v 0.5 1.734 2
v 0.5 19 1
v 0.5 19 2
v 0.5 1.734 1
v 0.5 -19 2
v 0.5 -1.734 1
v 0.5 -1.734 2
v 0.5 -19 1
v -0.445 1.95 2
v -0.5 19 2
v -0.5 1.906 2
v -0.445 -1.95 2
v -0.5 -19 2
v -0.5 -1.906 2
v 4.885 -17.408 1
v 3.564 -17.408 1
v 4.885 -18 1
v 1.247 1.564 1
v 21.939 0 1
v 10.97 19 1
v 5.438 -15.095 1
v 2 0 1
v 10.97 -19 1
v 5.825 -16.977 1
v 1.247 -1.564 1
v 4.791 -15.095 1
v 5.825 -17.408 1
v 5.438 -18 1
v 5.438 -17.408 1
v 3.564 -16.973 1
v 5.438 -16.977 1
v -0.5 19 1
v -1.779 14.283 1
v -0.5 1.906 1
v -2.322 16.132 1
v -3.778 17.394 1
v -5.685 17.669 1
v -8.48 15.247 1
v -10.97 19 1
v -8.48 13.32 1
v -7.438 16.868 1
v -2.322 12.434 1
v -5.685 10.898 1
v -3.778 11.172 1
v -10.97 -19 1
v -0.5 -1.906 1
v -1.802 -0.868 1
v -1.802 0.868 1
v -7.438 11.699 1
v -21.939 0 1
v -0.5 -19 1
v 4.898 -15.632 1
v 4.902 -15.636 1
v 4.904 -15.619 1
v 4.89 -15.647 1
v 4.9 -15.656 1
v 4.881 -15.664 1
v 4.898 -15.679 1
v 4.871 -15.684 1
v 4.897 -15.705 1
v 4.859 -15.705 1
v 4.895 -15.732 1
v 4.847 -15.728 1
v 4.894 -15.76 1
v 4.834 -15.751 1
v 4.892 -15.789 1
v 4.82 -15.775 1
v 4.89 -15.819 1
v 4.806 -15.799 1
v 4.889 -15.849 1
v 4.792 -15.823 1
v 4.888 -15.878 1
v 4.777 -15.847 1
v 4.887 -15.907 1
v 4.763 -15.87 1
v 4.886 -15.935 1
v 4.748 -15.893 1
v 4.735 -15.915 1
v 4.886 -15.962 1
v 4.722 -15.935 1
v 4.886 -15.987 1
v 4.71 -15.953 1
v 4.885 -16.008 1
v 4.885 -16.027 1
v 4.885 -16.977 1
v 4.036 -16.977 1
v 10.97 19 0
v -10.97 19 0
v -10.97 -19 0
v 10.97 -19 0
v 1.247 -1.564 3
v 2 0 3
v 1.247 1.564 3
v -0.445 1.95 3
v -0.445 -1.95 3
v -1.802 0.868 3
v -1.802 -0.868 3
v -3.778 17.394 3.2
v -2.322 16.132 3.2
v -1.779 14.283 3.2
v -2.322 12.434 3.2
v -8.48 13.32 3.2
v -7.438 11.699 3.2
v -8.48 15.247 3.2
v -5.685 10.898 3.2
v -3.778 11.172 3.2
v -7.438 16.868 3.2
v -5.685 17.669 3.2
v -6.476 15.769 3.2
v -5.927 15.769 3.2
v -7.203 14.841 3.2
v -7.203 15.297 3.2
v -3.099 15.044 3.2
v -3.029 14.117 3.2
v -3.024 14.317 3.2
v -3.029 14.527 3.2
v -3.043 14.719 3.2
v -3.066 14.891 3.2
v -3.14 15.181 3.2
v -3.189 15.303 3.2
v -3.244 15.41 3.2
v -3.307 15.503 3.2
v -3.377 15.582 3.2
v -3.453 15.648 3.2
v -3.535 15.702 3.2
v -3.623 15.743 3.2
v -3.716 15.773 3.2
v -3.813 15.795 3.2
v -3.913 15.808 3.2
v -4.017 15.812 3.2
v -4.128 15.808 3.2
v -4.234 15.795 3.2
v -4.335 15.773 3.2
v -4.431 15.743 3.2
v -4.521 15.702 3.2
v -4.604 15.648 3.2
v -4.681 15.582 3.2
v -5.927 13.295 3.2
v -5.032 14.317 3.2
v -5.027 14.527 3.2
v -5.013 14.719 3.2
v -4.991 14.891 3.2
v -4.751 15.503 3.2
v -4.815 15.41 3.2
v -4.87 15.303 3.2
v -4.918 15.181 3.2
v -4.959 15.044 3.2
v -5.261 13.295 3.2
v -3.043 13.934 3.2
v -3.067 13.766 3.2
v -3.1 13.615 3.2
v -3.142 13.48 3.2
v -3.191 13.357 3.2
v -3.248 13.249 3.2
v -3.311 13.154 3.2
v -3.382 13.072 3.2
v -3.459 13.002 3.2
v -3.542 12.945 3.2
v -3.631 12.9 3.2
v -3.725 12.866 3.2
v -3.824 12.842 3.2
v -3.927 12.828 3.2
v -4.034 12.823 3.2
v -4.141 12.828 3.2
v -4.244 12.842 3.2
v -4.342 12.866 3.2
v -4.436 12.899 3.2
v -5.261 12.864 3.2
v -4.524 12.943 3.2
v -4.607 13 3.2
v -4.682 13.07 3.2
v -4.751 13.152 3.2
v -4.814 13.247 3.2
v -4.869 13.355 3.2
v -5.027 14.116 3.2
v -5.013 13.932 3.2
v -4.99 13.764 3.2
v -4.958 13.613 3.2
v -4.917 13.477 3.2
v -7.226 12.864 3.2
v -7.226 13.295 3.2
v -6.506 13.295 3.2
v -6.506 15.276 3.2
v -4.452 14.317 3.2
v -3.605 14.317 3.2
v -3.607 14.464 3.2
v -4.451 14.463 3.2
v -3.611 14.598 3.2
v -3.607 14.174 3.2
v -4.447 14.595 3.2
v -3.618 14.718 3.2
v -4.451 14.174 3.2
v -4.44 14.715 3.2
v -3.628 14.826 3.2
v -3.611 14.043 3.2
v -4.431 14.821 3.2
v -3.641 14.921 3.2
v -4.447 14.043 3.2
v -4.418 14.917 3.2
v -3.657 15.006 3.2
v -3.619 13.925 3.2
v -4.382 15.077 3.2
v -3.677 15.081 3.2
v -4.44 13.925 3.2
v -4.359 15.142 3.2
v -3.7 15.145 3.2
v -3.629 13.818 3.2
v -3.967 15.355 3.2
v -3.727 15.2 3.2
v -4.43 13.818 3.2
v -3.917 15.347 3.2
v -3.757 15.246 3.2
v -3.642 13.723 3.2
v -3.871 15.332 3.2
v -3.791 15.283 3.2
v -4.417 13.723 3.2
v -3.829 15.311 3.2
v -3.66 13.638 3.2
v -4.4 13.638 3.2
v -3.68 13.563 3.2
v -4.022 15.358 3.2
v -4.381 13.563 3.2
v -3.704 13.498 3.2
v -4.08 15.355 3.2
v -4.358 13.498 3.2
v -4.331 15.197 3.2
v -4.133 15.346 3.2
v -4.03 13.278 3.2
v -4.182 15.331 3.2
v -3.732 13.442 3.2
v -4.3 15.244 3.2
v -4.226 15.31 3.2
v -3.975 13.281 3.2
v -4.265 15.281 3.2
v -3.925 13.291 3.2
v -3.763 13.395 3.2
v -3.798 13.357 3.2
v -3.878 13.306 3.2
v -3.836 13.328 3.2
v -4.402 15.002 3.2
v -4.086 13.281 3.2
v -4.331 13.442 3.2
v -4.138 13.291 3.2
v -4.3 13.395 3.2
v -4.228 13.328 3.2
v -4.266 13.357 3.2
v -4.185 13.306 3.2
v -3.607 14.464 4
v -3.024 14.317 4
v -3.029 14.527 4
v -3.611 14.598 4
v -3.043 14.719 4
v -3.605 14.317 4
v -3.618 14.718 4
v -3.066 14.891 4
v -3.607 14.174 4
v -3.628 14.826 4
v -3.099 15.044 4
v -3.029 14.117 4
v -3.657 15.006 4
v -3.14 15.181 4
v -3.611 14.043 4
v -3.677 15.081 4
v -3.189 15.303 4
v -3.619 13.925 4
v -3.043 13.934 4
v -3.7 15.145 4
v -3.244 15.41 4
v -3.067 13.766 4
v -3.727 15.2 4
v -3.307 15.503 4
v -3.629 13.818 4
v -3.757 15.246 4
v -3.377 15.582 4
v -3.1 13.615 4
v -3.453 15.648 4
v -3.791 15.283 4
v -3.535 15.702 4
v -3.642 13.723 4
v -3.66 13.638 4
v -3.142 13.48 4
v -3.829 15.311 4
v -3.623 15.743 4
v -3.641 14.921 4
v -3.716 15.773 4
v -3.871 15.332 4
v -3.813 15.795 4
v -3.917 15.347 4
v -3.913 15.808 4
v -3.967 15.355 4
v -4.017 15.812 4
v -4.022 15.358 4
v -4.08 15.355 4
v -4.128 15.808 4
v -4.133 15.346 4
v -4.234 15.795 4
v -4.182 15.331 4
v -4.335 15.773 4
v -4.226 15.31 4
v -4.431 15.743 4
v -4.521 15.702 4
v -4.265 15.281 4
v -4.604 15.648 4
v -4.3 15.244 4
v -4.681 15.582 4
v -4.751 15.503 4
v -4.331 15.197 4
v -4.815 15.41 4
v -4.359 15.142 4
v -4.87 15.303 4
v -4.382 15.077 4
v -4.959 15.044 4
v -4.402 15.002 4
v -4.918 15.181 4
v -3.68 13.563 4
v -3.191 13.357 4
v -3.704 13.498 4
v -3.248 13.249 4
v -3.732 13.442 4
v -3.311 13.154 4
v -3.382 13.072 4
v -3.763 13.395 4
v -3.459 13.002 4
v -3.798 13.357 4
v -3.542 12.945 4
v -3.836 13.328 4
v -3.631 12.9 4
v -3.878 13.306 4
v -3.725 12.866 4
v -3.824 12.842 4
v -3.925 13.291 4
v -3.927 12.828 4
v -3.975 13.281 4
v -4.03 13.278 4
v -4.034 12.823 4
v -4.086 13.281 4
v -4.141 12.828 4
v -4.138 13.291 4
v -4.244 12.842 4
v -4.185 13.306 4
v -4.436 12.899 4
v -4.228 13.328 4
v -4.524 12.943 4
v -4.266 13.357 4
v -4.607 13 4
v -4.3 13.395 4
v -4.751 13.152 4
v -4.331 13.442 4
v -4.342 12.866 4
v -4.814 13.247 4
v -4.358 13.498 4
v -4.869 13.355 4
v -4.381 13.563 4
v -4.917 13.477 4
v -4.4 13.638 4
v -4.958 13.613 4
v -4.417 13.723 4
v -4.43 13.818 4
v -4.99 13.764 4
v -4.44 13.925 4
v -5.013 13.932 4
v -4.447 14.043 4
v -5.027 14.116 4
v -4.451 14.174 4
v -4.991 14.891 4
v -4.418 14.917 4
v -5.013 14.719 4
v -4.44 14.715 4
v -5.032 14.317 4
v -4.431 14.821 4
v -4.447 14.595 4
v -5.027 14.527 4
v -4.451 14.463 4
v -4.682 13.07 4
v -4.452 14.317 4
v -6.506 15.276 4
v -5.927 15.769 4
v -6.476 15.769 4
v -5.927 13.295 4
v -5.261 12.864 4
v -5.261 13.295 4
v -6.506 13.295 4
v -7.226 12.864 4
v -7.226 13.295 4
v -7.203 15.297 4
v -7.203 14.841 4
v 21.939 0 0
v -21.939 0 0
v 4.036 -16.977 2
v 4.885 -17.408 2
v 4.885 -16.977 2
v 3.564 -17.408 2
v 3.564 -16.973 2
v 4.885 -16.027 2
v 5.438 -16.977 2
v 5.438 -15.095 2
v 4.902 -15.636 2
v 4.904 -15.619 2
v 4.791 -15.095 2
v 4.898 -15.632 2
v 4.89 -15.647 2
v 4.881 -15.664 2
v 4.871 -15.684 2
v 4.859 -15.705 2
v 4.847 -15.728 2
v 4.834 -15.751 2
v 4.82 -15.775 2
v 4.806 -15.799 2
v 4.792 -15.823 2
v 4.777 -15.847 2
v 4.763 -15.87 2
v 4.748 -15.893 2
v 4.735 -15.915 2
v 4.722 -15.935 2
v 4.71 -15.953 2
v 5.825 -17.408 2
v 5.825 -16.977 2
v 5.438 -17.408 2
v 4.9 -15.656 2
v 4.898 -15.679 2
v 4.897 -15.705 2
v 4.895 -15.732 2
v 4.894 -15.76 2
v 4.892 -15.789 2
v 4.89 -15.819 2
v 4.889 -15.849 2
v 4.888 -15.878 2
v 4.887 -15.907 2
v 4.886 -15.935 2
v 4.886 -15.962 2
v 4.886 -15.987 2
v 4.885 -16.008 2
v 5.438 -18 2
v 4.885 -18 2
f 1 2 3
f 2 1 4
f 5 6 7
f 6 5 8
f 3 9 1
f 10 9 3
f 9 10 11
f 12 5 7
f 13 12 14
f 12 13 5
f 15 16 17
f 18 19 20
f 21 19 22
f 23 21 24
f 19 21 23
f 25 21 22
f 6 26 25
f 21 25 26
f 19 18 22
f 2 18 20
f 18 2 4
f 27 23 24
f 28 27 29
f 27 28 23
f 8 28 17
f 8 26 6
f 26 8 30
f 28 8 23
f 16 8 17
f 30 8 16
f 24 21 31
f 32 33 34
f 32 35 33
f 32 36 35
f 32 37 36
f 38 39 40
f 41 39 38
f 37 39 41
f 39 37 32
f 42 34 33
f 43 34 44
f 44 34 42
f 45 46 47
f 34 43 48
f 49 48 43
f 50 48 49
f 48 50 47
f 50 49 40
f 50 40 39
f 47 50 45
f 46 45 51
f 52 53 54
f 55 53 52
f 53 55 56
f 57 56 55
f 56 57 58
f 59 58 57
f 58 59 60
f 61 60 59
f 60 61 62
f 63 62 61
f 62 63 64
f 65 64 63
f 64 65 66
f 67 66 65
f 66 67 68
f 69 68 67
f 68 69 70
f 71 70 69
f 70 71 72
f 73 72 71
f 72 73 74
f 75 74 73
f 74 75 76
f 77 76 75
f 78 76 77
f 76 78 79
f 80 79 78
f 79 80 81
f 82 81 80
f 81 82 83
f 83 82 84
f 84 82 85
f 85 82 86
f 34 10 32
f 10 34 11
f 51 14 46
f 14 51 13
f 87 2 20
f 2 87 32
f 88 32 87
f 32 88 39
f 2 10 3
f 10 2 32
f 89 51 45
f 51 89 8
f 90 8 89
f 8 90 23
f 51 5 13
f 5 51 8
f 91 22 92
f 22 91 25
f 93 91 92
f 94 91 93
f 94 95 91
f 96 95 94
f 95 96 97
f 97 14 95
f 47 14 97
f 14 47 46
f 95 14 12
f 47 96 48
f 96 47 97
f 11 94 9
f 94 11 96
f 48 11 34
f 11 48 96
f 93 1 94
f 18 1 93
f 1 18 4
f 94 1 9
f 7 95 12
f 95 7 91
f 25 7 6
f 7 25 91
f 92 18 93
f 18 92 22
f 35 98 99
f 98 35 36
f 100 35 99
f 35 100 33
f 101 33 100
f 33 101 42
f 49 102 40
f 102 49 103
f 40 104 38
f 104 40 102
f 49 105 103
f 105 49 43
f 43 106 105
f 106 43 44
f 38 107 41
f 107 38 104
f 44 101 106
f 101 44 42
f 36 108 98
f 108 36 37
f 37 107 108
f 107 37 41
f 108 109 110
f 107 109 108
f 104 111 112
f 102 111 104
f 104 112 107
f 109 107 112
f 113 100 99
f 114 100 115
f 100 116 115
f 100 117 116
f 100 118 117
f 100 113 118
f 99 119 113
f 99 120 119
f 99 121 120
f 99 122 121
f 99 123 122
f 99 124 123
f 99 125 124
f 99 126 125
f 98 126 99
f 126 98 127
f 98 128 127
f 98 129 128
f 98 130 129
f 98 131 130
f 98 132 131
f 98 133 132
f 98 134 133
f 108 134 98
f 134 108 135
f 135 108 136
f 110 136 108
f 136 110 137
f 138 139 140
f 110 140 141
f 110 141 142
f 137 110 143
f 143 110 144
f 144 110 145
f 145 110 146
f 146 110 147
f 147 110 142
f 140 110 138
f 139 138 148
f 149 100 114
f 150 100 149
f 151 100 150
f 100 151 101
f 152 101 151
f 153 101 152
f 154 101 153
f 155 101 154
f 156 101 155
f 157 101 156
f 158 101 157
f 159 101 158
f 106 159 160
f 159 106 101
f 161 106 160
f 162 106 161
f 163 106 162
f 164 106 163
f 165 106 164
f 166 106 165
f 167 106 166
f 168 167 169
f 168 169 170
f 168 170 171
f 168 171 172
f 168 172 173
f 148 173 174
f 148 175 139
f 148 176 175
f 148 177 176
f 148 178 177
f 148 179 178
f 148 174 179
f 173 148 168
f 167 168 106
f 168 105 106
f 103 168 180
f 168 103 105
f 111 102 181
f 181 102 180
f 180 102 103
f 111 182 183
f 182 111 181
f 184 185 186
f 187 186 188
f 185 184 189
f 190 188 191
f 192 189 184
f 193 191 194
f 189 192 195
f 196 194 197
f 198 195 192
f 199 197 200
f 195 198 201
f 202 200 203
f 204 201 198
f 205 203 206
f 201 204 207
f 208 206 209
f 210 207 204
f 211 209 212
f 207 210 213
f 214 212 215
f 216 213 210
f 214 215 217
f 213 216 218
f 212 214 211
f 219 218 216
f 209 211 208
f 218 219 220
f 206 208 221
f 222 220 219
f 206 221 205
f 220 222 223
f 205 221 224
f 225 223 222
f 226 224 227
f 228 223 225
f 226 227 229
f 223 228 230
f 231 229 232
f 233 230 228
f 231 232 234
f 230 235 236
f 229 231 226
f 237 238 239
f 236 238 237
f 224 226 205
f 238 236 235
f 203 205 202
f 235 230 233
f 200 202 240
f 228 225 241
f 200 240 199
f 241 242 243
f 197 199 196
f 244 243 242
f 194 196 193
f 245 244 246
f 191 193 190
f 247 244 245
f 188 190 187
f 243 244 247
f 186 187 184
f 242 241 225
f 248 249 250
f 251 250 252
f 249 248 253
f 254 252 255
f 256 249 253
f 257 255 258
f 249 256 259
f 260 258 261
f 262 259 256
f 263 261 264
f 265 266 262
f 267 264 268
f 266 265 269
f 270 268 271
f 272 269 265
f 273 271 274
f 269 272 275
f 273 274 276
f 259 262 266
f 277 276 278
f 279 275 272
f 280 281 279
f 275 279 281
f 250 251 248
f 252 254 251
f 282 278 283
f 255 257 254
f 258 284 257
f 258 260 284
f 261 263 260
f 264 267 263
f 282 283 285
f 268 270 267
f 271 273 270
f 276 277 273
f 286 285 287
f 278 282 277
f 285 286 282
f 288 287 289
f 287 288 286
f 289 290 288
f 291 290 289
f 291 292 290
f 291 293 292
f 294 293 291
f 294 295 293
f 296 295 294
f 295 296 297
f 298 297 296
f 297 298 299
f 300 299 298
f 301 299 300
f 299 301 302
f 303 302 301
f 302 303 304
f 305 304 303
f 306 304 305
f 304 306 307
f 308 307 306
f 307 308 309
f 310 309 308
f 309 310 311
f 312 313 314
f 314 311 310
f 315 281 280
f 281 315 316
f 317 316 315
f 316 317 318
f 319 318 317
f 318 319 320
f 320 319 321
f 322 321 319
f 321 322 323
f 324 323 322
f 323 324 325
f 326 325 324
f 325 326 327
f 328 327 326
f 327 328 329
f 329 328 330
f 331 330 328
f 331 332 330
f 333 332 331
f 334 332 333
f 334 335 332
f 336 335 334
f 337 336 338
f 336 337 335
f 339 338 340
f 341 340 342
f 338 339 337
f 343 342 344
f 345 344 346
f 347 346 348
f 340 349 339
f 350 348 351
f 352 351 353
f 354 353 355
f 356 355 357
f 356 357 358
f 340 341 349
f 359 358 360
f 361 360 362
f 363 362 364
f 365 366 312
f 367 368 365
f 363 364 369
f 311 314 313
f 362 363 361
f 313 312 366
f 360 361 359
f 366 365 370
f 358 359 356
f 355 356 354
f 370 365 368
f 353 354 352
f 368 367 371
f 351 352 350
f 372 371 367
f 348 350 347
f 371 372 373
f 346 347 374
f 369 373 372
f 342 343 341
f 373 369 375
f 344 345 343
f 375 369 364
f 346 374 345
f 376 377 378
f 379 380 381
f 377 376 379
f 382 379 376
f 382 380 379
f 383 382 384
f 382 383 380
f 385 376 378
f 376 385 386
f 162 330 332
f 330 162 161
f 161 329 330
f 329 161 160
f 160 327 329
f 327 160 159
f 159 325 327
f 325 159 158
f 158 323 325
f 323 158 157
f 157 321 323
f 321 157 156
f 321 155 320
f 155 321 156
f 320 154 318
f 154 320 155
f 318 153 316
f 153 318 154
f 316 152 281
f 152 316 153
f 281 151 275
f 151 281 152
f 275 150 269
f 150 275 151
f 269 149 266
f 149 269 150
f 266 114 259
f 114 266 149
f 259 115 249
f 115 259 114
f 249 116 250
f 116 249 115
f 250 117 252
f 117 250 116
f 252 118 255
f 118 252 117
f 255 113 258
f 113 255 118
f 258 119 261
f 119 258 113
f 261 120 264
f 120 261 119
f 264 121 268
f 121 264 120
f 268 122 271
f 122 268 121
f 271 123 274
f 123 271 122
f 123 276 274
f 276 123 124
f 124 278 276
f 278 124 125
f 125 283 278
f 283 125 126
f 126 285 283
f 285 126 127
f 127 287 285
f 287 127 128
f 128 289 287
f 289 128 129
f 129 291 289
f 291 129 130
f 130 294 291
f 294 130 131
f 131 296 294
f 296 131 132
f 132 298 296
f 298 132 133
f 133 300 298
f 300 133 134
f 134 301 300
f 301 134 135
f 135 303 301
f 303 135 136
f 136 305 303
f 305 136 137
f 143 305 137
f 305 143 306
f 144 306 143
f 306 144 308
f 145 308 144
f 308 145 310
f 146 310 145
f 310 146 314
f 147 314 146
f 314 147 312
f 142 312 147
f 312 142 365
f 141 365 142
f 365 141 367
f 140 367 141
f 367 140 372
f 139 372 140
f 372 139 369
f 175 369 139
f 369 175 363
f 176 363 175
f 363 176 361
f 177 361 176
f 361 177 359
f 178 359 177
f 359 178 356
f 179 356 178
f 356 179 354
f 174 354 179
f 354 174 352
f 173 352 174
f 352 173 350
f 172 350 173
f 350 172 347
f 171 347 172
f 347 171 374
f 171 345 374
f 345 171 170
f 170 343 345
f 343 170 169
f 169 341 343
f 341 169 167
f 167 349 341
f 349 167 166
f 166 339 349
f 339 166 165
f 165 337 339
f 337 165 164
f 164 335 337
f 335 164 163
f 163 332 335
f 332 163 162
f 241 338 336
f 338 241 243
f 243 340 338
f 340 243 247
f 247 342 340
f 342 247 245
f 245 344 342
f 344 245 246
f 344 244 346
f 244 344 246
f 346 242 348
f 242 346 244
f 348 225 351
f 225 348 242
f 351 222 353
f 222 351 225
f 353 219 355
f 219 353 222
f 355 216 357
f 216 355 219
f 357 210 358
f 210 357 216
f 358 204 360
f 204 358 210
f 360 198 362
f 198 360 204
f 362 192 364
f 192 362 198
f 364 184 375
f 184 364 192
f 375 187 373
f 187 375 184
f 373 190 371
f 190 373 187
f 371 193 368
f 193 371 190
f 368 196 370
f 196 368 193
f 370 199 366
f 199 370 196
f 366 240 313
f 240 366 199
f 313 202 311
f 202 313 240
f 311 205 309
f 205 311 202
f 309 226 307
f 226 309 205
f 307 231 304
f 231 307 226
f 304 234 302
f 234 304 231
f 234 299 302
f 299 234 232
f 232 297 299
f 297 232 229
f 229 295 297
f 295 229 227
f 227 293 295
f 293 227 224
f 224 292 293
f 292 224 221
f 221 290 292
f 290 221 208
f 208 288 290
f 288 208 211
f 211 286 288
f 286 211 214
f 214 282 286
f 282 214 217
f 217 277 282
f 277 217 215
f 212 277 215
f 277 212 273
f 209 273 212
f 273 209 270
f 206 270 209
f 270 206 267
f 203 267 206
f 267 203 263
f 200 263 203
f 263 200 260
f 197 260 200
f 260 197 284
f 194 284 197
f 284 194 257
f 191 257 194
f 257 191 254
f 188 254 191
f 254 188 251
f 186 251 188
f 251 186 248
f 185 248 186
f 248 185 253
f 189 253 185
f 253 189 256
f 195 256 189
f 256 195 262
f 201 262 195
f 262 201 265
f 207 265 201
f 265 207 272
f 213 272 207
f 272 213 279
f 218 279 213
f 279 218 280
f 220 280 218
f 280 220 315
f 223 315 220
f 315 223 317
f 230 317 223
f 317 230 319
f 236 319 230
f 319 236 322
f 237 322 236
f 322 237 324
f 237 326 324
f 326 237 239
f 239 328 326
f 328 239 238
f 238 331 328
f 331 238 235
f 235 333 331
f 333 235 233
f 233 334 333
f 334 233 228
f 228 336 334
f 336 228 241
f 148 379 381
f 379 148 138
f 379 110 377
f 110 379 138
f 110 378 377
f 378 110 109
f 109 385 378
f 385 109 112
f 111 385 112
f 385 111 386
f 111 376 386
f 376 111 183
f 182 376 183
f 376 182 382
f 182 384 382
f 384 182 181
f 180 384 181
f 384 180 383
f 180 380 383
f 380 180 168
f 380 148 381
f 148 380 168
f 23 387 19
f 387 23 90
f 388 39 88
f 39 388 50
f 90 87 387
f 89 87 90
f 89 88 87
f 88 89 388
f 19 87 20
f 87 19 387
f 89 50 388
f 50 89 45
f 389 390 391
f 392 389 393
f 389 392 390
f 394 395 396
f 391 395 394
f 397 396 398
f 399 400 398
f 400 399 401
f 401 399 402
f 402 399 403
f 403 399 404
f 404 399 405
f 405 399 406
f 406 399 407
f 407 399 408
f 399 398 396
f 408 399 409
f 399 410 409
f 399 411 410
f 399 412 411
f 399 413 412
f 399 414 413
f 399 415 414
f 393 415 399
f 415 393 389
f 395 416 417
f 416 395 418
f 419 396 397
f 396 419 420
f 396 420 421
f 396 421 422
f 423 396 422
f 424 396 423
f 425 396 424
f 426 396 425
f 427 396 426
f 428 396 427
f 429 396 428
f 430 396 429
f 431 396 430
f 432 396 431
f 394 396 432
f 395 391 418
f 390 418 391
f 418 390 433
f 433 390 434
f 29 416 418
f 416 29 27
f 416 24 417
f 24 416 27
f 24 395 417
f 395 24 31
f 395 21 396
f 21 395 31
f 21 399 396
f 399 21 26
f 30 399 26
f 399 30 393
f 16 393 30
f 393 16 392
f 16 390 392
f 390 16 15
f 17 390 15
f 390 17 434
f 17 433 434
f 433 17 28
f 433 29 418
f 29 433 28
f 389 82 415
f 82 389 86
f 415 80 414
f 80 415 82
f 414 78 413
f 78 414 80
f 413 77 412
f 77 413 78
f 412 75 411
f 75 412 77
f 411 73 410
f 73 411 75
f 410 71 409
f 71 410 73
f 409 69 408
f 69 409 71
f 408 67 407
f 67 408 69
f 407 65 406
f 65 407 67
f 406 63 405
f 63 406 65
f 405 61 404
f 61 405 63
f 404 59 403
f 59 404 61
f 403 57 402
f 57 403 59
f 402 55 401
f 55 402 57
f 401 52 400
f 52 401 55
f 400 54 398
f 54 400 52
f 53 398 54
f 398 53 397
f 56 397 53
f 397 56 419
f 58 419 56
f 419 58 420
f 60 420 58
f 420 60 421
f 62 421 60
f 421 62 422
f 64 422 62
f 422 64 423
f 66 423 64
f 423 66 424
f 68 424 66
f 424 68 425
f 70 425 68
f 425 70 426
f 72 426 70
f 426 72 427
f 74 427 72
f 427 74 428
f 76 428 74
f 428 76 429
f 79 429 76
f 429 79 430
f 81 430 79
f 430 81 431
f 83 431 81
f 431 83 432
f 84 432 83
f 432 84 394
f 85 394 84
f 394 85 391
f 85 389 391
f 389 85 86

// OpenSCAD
include <../Scripts/18xx tiles basic functions.scad>
hex();
put_tilenr("4");
small_town_straight(r=0);
put_value("10",-20);
